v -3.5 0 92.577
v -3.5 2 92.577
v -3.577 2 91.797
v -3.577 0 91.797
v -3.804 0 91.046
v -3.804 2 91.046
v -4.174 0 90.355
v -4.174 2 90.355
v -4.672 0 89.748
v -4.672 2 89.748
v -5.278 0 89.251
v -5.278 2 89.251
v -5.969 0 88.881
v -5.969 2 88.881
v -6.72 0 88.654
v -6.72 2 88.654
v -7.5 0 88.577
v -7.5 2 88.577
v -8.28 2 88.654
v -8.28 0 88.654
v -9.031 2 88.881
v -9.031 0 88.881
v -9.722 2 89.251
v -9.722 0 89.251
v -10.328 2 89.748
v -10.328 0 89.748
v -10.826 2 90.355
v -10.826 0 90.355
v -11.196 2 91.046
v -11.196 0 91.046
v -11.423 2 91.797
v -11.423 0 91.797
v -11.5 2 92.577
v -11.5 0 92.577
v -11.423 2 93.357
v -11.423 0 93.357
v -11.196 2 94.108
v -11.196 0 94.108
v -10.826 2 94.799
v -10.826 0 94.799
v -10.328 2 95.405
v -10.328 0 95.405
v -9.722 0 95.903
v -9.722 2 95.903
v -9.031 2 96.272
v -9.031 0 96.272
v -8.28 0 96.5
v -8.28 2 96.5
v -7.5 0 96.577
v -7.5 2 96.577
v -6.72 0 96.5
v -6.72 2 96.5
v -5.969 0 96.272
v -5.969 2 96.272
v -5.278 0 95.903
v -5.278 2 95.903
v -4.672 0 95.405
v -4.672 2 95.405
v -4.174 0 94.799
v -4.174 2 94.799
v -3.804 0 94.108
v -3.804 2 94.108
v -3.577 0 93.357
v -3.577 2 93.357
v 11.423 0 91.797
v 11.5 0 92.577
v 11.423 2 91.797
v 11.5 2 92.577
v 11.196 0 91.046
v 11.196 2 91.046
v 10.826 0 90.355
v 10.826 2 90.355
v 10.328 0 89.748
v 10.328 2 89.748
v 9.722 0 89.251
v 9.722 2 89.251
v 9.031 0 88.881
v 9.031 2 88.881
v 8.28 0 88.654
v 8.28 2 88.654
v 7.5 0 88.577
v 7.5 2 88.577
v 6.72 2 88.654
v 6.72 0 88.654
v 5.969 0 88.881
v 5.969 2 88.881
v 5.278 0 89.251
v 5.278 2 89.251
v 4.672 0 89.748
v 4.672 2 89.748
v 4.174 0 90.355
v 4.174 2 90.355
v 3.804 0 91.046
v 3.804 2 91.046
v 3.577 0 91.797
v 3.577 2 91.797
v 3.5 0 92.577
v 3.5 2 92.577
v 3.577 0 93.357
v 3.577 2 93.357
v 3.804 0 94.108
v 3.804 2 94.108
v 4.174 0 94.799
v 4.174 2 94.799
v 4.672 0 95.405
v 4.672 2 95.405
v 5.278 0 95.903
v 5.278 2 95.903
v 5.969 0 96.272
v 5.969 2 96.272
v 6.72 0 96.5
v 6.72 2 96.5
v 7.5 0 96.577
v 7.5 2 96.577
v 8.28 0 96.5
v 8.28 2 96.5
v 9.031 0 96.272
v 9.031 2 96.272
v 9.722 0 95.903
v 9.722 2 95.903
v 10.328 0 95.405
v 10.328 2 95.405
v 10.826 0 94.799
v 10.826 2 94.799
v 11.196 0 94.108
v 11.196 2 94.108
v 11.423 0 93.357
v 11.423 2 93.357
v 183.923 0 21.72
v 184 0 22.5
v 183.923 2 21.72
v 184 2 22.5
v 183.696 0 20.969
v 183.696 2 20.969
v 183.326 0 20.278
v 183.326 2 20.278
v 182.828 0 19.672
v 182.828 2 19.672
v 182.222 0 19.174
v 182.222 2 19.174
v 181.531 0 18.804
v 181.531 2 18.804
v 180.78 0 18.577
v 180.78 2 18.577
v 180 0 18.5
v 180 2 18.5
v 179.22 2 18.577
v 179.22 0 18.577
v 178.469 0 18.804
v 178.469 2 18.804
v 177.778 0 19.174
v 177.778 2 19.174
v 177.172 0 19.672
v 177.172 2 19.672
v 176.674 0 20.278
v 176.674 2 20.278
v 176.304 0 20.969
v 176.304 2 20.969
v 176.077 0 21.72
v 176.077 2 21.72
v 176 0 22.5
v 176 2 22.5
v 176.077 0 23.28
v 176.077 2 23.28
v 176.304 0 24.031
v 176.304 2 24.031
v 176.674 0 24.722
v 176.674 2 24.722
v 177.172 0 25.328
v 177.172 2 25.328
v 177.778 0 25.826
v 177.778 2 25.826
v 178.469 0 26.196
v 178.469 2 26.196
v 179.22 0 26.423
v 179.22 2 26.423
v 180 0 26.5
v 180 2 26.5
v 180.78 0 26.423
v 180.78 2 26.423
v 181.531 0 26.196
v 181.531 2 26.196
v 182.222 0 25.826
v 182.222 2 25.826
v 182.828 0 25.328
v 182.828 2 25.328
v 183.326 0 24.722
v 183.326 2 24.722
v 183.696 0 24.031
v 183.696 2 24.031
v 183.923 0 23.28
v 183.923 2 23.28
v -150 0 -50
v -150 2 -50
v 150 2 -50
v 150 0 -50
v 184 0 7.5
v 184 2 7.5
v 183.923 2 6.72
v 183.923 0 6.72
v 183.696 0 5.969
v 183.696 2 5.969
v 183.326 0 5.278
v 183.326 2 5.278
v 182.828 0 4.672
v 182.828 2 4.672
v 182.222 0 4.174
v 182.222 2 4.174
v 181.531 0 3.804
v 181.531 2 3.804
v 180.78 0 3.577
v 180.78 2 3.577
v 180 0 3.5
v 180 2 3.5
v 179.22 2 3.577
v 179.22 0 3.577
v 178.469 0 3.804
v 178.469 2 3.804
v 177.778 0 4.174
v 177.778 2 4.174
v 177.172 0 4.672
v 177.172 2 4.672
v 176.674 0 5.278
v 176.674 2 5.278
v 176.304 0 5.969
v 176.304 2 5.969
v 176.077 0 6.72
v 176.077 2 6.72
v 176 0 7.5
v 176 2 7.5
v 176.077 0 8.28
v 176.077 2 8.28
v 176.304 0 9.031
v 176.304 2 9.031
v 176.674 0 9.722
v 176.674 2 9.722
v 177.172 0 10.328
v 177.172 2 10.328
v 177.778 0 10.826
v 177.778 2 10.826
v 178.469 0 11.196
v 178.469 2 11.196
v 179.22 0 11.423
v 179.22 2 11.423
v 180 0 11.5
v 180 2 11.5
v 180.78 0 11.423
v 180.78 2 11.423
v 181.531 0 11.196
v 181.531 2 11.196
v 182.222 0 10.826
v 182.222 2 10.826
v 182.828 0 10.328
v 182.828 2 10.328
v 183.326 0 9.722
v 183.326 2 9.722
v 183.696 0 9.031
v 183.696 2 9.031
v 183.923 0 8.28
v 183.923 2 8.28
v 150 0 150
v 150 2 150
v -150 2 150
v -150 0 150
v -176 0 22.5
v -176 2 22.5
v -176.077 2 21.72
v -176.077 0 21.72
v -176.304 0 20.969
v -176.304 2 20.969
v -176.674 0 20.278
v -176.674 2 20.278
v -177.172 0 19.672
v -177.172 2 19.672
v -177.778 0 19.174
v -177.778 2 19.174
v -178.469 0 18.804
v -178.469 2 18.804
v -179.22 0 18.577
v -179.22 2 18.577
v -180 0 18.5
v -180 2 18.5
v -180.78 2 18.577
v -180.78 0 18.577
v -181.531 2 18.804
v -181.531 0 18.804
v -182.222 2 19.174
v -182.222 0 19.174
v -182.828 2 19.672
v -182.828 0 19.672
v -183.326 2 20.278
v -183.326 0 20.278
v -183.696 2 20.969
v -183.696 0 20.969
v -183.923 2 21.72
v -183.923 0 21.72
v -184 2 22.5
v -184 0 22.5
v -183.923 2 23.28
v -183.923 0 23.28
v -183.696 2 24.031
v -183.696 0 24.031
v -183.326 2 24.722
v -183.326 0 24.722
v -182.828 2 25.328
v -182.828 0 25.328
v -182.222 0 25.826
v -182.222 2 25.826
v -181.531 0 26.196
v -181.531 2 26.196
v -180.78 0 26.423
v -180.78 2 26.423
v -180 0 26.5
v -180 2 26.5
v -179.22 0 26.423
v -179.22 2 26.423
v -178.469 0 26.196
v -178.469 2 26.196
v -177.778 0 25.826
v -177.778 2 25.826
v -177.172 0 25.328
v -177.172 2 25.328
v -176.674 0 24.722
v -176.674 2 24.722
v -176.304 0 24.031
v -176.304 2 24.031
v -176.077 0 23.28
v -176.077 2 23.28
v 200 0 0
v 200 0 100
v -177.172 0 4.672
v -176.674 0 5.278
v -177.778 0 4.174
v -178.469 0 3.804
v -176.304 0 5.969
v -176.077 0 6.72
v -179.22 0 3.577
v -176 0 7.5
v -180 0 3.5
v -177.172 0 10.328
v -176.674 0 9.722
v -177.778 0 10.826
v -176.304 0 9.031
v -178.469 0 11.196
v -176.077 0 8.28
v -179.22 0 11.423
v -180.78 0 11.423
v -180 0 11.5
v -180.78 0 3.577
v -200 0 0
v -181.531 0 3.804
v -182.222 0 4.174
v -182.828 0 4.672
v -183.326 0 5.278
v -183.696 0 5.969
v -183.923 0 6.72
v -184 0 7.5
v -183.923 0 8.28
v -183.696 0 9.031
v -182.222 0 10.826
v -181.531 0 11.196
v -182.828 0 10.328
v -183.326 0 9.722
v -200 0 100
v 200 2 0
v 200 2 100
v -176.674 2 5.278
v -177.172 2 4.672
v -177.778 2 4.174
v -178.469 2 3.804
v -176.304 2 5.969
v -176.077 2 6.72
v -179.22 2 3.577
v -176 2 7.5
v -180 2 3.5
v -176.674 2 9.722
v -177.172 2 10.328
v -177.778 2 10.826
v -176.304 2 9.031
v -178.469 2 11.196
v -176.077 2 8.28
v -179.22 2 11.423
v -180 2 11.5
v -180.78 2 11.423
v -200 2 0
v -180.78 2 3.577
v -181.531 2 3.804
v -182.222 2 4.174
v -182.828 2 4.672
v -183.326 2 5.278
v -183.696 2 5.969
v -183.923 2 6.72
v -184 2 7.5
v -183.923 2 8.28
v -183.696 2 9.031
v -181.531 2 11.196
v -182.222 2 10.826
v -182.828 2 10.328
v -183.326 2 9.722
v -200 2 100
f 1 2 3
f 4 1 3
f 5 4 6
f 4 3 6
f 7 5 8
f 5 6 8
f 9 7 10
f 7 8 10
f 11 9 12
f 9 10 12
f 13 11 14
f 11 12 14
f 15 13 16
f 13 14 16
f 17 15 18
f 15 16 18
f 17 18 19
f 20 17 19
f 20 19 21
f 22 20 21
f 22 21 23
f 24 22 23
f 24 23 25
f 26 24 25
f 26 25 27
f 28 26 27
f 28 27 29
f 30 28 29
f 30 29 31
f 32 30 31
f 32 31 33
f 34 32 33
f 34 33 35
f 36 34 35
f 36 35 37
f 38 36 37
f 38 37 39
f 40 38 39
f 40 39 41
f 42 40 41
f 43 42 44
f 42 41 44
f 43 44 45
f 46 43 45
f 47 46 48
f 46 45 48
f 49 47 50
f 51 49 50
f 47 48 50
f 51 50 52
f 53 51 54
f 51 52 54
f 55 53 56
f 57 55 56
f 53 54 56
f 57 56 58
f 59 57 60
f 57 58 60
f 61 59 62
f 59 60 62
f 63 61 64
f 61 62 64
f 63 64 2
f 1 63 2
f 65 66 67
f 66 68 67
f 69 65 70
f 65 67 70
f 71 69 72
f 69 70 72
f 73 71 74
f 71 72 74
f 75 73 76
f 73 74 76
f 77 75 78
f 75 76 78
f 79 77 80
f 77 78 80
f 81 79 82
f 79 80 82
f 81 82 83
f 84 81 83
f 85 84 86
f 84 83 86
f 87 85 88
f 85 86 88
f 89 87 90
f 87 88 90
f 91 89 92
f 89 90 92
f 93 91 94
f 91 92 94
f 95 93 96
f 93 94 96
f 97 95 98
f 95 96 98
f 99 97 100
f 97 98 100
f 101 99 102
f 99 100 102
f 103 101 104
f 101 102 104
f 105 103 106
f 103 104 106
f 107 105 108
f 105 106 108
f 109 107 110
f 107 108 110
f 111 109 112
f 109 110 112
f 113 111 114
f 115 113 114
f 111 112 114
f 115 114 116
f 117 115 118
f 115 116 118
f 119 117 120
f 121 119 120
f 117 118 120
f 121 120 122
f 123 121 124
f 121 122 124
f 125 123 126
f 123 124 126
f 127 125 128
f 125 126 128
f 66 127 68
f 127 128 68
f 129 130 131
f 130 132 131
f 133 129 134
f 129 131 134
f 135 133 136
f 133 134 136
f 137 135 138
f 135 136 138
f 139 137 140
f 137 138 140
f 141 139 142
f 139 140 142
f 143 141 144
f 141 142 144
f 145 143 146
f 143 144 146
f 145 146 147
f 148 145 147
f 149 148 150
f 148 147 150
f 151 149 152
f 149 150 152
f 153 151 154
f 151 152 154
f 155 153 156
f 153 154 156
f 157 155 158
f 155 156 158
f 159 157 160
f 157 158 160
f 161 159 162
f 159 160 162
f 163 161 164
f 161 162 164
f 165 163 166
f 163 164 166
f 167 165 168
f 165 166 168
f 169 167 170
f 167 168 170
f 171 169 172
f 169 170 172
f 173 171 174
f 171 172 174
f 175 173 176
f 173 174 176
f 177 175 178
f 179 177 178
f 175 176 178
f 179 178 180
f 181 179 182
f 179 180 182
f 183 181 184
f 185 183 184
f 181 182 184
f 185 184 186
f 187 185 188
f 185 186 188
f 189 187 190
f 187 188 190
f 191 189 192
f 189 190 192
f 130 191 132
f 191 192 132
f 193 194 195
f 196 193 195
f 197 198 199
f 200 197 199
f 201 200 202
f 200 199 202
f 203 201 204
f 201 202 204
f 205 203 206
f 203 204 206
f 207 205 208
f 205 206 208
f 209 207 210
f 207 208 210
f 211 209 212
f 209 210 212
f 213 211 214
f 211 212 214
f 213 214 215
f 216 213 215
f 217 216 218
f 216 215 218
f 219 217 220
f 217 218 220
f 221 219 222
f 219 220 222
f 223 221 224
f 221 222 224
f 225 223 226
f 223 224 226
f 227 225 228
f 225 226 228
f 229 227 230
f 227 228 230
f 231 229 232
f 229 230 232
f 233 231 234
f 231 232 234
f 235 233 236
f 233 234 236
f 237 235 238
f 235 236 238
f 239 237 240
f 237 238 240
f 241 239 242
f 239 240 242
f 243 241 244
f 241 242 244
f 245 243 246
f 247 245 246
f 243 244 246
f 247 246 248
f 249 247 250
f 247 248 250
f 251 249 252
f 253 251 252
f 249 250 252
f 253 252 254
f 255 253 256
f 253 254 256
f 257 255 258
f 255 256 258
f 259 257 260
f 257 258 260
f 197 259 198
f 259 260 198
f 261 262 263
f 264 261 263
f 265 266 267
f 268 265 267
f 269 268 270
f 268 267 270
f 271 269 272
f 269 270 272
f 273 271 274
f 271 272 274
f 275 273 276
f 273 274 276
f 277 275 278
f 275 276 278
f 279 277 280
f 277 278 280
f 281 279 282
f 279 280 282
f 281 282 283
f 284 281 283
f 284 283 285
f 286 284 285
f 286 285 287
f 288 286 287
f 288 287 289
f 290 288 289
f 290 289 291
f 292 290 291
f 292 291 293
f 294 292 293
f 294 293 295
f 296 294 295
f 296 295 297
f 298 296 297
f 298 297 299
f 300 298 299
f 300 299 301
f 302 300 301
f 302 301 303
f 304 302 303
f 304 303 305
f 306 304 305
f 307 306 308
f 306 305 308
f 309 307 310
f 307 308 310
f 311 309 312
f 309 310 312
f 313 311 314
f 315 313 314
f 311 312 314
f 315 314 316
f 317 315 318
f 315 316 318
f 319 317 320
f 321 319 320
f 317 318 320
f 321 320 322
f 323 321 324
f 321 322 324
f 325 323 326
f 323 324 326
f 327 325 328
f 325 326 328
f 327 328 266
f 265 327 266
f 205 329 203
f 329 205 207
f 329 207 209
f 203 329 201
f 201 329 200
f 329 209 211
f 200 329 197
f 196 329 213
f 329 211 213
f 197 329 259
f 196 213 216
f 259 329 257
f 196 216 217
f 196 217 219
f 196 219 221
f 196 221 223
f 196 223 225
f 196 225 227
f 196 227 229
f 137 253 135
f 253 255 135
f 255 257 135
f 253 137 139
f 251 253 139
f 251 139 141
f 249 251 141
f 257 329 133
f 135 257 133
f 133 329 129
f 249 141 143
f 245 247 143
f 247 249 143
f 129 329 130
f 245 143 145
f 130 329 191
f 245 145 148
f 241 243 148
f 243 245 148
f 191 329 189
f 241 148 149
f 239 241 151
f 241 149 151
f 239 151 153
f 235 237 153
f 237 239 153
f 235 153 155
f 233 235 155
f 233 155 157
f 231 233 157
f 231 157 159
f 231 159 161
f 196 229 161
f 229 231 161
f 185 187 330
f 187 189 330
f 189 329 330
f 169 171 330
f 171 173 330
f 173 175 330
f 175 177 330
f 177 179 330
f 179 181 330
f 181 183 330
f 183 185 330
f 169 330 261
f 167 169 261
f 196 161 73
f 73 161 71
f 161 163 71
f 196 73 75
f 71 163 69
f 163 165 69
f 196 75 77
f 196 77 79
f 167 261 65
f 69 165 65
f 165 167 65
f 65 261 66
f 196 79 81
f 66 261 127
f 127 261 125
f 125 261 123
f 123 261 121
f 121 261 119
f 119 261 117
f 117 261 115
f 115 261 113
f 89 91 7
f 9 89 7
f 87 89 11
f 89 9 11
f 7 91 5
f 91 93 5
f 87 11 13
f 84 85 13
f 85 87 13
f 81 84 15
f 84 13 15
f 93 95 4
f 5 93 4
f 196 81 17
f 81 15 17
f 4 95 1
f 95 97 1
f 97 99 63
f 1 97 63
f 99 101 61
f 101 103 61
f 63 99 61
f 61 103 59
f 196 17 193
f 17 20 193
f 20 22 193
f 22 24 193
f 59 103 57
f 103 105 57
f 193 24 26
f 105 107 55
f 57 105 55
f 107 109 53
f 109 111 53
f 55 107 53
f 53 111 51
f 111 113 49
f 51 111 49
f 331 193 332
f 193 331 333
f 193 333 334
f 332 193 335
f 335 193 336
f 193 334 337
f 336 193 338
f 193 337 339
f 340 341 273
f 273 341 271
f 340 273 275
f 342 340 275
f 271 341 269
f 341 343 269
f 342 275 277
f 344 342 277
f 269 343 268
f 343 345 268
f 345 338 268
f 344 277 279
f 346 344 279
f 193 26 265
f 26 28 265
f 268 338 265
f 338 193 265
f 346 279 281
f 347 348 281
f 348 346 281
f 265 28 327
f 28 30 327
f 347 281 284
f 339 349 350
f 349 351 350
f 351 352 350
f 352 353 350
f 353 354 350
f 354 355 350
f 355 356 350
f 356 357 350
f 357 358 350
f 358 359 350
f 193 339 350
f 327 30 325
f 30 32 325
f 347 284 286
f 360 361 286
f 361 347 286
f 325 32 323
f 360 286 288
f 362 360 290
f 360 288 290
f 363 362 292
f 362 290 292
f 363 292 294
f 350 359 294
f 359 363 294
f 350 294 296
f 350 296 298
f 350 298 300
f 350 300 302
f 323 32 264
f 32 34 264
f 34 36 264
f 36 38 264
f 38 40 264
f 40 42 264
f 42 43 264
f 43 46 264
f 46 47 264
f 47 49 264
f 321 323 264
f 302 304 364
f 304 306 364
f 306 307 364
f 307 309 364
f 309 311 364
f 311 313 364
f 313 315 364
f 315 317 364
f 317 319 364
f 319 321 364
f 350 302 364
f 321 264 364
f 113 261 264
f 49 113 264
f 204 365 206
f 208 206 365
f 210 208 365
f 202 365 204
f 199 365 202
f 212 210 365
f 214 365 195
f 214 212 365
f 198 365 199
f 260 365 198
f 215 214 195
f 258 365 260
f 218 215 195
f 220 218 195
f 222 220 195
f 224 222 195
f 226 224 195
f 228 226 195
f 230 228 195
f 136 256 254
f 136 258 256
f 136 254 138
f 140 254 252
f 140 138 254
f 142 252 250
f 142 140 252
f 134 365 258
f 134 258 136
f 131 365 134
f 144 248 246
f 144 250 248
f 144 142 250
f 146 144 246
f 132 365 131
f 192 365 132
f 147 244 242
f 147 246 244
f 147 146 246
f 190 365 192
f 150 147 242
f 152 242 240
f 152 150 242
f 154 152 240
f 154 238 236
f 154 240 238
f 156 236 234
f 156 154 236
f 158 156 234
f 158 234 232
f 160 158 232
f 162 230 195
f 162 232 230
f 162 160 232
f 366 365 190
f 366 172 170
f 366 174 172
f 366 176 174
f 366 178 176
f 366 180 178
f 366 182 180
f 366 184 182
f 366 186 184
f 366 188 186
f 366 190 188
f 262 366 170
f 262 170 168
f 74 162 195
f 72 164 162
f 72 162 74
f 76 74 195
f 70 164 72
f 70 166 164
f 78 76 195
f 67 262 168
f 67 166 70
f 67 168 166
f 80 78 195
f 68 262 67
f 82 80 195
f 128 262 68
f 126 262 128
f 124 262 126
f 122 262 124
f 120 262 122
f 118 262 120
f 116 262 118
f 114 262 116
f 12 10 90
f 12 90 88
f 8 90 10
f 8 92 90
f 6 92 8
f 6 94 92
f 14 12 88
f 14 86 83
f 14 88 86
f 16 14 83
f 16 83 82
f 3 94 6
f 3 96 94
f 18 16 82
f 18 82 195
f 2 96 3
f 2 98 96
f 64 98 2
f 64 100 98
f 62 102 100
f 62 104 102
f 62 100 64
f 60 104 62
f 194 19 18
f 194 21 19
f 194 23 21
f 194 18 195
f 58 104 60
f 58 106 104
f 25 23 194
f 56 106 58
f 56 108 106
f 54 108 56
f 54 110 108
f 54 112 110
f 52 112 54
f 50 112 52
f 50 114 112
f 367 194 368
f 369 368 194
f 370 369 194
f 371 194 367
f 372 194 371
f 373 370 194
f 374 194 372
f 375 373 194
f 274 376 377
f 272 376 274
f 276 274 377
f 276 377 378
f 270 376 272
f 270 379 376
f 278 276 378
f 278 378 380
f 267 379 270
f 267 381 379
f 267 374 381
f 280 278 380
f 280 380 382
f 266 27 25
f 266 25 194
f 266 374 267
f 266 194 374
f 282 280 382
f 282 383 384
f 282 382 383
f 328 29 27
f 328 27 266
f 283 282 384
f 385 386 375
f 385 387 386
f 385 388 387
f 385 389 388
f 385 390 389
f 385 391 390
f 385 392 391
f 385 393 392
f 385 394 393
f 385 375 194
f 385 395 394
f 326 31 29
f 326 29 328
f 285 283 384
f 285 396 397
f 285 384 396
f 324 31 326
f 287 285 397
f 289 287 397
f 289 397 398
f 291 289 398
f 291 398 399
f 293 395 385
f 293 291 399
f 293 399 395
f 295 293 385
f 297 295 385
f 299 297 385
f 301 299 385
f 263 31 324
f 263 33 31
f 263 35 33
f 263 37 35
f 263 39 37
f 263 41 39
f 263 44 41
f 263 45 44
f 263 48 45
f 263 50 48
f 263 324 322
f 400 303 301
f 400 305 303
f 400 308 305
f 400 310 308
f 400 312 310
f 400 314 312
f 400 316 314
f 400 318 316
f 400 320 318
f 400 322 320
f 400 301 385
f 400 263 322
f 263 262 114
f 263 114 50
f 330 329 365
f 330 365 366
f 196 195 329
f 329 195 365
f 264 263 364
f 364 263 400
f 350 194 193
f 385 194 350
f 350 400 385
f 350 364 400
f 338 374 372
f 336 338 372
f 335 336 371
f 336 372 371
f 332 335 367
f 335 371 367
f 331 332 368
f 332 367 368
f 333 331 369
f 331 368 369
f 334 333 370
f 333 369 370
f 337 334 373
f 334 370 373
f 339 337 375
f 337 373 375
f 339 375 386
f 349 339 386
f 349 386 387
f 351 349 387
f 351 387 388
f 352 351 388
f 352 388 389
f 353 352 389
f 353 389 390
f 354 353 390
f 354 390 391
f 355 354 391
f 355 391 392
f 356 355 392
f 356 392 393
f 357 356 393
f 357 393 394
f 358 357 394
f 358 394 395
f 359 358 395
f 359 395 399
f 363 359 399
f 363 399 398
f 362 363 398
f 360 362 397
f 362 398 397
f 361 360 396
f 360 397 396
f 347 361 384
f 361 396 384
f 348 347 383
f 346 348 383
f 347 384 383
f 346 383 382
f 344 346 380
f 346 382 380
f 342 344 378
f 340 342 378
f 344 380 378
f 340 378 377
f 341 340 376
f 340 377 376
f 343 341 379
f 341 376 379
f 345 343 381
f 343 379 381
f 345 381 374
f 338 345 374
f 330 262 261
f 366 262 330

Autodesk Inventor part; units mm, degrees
ref_plane "YZ Plane" through (0, 0, 0) normal (1, 0, 0) x (0, 1, 0)
ref_plane "XZ Plane" through (0, 0, 0) normal (0, 1, 0) x (-1, 0, 0)
sketch "Sketch1" plane through (0, 0, 0) normal (0, 1, 0) x (-1, 0, 0)
  line L0 (-200, 300) -> (200, 300)
  line L1 (200, 300) -> (200, -300)
  line L2 (200, -300) -> (-200, -300)
  line L3 (-200, -300) -> (-200, 300)
  line L4 (-200, 300) -> (200, -300) construction
  line L5 (200, 300) -> (-200, -300) construction
  point P0 (0, 0)
  dimension "d0" = 400
  dimension "d1" = 600
extrude "Extrusion1" add sketch "Sketch1" along normal blind 2
sketch "Sketch2" plane through (0, 2, 0) normal (0, 1, 0) x (1, 0, 0)
  line L0 (200, 300) -> (-200, 300) projected
  line L1 (-200, 300) -> (-200, 275)
  line L2 (-200, 300) -> (-200, -300) projected
  line L3 (-200, 300) -> (-100, 300)
  line L4 (-100, 300) -> (-200, 275)
  line L5 (-200, 275) -> (-200, 250)
  line L6 (-200, 250) -> (-175, 250)
  line L7 (-175, 250) -> (-175, 150)
  line L8 (-175, 150) -> (-200, 150)
  line L9 (-200, 250) -> (-200, 150)
  line L10 (0, 250) -> (0, 74.4907)
  line L11 (-155.9773, 0) -> (157.8952, 0)
  line L12 (-200, 300) -> (200, 300)
  line L13 (200, 300) -> (200, -300)
  line L14 (100, 300) -> (200, 275)
  line L15 (200, 250) -> (175, 250)
  line L16 (175, 250) -> (175, 150)
  line L17 (175, 150) -> (200, 150)
  line L18 (200, -300) -> (-200, -300)
  line L19 (-200, -300) -> (-200, -275)
  line L20 (-200, -300) -> (-100, -300)
  line L21 (-100, -300) -> (-200, -275)
  line L22 (-200, -275) -> (-200, -250)
  line L23 (-200, -250) -> (-200, -150)
  line L24 (200, -300) -> (200, 300)
  line L25 (100, -300) -> (200, -275)
  line L26 (-200, -300) -> (200, -300)
  point P0 (0, 0)
  dimension "d4" = 25
  dimension "d5" = 100
  dimension "d6" = 25
  dimension "d7" = 25
  dimension "d8" = 100
extrude "Extrusion2" cut sketch "Sketch2" against normal blind 2 contours L13 L14 L0 | L4 L1 L0 | L13 L17 L16 L15 | L6 L7 L8 L2 | L13 L18 L25 | L18 L2 L21
mirror "Mirror2" about plane through (0, 0, 0) normal (1, 0, 0)
ref_plane "Work Plane2" through (-100, 0, 190) normal (0, 0, 1) x (1, 0, 0)
mirror "Mirror4" about plane through (-100, 0, 190) normal (0, 0, 1) of "Mirror2"
sketch "Sketch13" plane through (0, 2, 0) normal (0, 1, 0) x (1, 0, 0)
  line L0 (-200, 150) -> (-200, -275) projected
  line L1 (-200, 0) -> (-200, 150)
  line L2 (-200, 150) -> (200, 150)
  line L3 (200, 150) -> (200, -150)
  line L4 (200, -150) -> (-200, -150)
  line L5 (-200, 0) -> (-200, 50)
  line L6 (-200, 50) -> (200, 50)
  line L7 (-200, 50) -> (-200, 595.1707)
  line L8 (-200, 595.1707) -> (291.7949, 595.1707)
  line L9 (291.7949, 595.1707) -> (291.7949, 150)
  line L10 (291.7949, 150) -> (200, 150)
  line L11 (-200, -150) -> (-200, -431.5542)
  line L12 (-200, -431.5542) -> (200, -431.5542)
  line L13 (200, -431.5542) -> (200, -150)
  point P0 (0, 0)
  dimension "d71" = 400
  dimension "d72" = 300
  dimension "d73" = 50
extrude "Extrusion11" cut sketch "Sketch13" against normal blind 10 contours L2 L3 L6 L0 | L7 L8 L9 L10 L2 | L4 L13 L12 L11 L0
sketch "Sketch14" plane through (0, 2, 0) normal (0, 1, 0) x (1, 0, 0)
  line L0 (-250, 100) -> (-150, 100)
  line L1 (-150, 100) -> (-150, 0)
  line L2 (-150, 0) -> (-250, 0)
  line L3 (-250, 0) -> (-250, 100)
  line L4 (-200, 50) -> (-200, -150) projected
  line L5 (-250, 100) -> (-150, 0) construction
  line L6 (-150, 100) -> (-250, 0) construction
  line L7 (200, 50) -> (-200, 50) projected
  line L8 (-150, 50) -> (-200, 0)
  line L9 (-200, 50) -> (-200, -50)
  line L10 (-200, -50) -> (200, -50)
  line L11 (0, 0) -> (0, -87.9853)
  line L12 (-250, -200) -> (-150, -200)
  line L13 (-150, -200) -> (-150, -100)
  line L14 (-150, -100) -> (-250, -100)
  line L15 (-250, -100) -> (-250, -200)
  line L16 (-150, -150) -> (-200, -100)
  line L17 (250, 100) -> (150, 100)
  line L18 (150, 100) -> (150, 0)
  line L19 (150, 0) -> (250, 0)
  line L20 (250, 0) -> (250, 100)
  line L21 (150, 50) -> (200, 0)
  line L22 (250, -200) -> (150, -200)
  line L23 (250, -100) -> (250, -200)
  line L24 (150, -100) -> (250, -100)
  line L25 (150, -150) -> (200, -100)
  line L26 (150, -200) -> (150, -100)
  dimension "d76" = 100
  dimension "d77" = 100
  dimension "d78" = 100
extrude "Extrusion12" cut sketch "Sketch14" against normal blind 10 contours L0 L1 L7 L4 L2 L3 | L8 L4 L7 | L15 L14 L16 L13 L12 | L20 L19 L21 L18 L17 | L22 L26 L25 L24 L23
sketch "Sketch15" plane through (0, 2, 0) normal (0, 1, 0) x (1, 0, 0)
  line L0 (-200, 0) -> (-200, -100) projected
  line L1 (-200, 0) -> (-200, -30)
  line L2 (-200, -30) -> (-170, -30)
  line L3 (-170, -30) -> (-170, 0)
  line L4 (-180, -15) -> (-180, -16)
  line L5 (-180, -16) -> (-180, -15)
  line L6 (-180, -15) -> (-180, -14)
  circle A0 centre (-180, -7.5) radius 4
  circle A1 centre (-180, -22.5) radius 4
  line L7 (0, 0) -> (0, -46.3113)
  circle A2 centre (180, -7.5) radius 4
  circle A3 centre (180, -22.5) radius 4
  dimension "d81" = 30
  dimension "d82" = 30
  dimension "d86" = 1
  dimension "d89" = 8
  dimension "d99" = 15
extrude "Extrusion13" cut sketch "Sketch15" against normal blind 10
sketch "Sketch16" plane through (0, 2, 0) normal (0, 1, 0) x (1, 0, 0)
  circle A0 centre (-80, -99.9978) radius 4 projected
  circle A1 centre (70, -99.9978) radius 4 projected
  circle A2 centre (7.5, -92.5769) radius 4
  circle A3 centre (-7.5, -92.5769) radius 4
  line L0 (0, -99.9978) -> (0, -89.9978)
  line L1 (0, -99.9978) -> (0, -91.9978)
  point P0 (0, 0)
  dimension "d95" = 8
  dimension "d96" = 8
  dimension "d106" = 8
extrude "Extrusion14" cut sketch "Sketch16" against normal blind 10 contours A2 | A3
ref_plane "Work Plane1" through (0, 0, 0) normal (1, 0, 0) x (0, 1, 0)
ref_plane "Work Plane3" through (0, 0, 380) normal (-1, 0, 0) x (0, 1, 0)
ref_plane "Work Plane4" through (0, 0, 380) normal (-1, 0, 0) x (0, 1, 0)
properties part number "chassis up" material "Steel, Mild"
